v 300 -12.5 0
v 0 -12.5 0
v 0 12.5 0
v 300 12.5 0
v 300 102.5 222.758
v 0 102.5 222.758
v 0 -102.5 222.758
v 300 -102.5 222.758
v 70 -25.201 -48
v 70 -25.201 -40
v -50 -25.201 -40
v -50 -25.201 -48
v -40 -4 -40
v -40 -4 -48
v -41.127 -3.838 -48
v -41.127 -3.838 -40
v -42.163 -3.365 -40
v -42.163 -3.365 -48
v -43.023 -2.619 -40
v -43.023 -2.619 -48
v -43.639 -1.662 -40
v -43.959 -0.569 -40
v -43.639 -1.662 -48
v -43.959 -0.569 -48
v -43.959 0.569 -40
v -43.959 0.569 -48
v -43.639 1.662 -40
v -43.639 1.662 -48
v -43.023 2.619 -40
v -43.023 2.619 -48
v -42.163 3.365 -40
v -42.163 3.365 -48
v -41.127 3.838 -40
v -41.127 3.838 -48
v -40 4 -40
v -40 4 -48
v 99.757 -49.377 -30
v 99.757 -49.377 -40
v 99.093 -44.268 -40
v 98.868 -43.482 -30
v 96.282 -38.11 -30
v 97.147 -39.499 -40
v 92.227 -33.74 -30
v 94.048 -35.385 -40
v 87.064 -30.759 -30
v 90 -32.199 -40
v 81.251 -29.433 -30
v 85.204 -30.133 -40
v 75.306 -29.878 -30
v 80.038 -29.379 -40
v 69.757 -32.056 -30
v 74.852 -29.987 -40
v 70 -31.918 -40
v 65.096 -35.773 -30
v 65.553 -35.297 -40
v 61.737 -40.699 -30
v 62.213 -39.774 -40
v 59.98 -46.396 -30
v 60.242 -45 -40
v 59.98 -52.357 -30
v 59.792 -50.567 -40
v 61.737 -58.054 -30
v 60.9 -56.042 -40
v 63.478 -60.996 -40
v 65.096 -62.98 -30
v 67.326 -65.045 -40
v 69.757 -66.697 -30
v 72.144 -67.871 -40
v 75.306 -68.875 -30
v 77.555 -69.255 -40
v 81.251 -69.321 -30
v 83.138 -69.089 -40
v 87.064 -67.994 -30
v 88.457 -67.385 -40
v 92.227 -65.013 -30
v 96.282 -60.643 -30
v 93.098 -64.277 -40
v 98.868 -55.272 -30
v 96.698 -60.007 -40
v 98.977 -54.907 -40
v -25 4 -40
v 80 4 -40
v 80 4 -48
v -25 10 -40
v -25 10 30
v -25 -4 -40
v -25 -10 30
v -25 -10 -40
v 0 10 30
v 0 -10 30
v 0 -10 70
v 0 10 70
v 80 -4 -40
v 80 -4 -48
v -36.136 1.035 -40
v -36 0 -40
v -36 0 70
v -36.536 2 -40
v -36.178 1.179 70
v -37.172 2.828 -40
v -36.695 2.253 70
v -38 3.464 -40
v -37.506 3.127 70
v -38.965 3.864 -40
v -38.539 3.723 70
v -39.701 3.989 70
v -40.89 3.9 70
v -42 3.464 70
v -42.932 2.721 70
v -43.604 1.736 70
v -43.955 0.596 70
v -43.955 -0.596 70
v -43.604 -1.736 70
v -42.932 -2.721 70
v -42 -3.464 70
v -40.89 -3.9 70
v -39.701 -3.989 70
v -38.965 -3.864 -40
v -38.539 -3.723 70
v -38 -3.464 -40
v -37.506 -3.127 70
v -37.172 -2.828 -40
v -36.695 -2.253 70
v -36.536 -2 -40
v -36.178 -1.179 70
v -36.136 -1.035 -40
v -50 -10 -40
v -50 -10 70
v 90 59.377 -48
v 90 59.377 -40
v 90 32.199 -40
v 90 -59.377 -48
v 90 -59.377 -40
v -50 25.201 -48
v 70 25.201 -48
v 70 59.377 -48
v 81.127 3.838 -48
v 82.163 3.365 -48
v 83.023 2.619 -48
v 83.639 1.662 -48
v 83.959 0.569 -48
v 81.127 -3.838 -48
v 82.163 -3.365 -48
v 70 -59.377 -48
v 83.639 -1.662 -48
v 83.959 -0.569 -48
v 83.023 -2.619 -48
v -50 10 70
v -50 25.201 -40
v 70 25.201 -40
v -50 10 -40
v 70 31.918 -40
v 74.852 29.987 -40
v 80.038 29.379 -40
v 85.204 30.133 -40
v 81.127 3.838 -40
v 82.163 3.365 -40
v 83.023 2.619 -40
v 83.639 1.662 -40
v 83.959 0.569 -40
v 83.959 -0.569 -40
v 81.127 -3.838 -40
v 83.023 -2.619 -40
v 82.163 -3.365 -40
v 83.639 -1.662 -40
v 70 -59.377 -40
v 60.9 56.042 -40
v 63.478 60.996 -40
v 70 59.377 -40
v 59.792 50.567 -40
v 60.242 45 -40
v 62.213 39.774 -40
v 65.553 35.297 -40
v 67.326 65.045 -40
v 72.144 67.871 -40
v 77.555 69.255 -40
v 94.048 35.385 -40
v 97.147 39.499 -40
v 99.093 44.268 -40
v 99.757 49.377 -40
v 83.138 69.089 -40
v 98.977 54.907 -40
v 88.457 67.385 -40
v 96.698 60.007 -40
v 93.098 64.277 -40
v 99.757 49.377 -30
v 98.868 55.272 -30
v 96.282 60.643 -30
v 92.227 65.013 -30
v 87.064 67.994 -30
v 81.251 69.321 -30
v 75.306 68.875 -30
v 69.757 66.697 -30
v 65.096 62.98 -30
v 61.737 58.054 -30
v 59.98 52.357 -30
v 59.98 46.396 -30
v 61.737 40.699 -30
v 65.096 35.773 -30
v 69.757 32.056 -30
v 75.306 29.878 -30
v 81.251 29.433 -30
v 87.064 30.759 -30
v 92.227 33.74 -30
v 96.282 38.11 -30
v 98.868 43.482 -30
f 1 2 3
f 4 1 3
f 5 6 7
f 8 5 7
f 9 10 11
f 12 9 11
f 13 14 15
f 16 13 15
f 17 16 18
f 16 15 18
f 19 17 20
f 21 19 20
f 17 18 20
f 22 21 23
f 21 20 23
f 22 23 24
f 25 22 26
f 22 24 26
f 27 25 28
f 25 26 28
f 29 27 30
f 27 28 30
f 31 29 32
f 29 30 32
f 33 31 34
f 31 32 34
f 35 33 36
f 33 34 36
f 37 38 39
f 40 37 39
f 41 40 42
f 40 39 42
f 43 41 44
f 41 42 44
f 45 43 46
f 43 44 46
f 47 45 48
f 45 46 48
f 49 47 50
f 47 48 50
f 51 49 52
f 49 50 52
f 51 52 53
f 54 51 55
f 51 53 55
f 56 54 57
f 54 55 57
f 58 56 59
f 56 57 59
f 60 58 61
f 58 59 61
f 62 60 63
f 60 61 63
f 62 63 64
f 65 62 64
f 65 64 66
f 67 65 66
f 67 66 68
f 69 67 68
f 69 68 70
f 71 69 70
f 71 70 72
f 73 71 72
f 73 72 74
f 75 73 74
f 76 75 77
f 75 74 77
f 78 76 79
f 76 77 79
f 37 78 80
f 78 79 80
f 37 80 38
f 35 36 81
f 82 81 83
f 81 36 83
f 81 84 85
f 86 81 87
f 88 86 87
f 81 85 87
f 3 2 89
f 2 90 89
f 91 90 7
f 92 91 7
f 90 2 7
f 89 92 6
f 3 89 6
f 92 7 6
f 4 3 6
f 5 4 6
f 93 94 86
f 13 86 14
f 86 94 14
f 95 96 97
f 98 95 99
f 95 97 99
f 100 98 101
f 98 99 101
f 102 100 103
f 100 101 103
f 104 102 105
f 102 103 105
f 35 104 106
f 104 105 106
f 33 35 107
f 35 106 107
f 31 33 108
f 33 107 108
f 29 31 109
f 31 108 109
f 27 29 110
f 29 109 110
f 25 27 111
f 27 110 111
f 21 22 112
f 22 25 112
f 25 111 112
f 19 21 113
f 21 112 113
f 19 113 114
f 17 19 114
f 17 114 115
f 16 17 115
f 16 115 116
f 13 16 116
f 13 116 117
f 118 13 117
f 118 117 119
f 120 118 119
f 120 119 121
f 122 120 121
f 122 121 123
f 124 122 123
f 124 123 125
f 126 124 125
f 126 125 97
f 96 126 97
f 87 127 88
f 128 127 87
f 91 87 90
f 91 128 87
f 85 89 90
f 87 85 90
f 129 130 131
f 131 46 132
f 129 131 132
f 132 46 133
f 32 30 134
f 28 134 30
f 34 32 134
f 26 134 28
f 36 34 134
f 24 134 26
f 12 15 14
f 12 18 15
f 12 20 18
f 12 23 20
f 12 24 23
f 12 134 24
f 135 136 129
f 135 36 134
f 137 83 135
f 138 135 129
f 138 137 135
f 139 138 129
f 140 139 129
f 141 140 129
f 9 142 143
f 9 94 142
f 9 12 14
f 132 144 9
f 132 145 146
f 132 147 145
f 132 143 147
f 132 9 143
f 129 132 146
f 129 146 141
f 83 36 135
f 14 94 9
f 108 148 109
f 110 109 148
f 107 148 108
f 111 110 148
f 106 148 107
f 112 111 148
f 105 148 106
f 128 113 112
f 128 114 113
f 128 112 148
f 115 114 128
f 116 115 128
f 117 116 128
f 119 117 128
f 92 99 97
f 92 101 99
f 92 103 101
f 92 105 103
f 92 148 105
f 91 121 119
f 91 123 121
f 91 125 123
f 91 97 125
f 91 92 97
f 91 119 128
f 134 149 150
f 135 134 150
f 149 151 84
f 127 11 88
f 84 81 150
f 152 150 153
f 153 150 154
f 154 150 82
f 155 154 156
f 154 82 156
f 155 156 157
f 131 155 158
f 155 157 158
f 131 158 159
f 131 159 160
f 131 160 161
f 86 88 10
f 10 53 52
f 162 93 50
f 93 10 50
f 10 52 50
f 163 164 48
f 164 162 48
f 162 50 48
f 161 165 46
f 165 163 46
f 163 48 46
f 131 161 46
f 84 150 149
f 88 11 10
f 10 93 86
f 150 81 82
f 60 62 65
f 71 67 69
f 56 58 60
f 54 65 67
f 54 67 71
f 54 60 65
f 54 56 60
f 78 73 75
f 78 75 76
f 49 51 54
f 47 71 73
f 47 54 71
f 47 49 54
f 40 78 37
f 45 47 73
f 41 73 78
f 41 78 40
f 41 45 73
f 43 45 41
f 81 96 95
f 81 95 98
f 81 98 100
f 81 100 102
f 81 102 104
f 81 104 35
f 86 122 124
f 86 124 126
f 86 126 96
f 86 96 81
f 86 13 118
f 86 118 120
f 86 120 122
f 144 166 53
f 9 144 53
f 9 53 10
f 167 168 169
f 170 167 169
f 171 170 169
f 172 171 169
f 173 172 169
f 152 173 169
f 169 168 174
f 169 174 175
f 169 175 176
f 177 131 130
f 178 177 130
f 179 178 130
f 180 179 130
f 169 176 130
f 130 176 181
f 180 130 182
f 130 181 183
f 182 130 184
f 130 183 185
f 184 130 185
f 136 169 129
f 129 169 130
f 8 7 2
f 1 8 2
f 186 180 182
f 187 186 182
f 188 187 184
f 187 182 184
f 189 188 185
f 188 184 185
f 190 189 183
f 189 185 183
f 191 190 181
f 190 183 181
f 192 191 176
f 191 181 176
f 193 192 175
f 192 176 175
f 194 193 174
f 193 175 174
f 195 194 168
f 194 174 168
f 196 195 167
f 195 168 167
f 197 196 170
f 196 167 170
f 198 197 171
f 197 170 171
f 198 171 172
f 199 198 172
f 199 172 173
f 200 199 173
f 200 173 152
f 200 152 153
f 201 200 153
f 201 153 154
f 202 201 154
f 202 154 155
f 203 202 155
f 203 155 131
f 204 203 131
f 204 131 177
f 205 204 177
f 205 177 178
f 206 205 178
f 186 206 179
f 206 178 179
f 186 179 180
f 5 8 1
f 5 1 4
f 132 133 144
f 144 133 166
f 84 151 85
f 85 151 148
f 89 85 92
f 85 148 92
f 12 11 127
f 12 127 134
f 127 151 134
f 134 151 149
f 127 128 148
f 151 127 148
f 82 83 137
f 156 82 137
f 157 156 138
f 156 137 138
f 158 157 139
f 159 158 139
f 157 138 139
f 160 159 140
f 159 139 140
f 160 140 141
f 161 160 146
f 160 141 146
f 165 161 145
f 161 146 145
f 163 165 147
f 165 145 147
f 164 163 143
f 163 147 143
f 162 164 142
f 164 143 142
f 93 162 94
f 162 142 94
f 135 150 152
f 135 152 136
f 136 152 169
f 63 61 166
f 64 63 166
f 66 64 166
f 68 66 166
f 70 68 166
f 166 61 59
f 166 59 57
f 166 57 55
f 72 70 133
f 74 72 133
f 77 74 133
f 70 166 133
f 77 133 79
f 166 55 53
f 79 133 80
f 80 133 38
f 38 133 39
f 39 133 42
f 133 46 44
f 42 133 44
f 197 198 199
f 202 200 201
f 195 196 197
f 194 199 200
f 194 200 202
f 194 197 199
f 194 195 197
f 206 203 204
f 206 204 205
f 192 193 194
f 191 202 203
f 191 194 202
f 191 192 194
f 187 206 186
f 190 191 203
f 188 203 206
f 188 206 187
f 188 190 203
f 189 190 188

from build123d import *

# Parameters (mm, degrees)
F1_DEPTH  = 300
F2_W      = 20
F2_H      = 40
F3_DEPTH  = 50
F5_W      = 25
F5_H      = 20
F6_DEPTH  = 70
F7_R      = 4
F8_DEPTH  = 120
F10_DEPTH = 8
F11_R     = 20
F12_DEPTH = 10
F14_DEPTH = 8


with BuildPart() as f1:
    # F0 (on Right) → F1 (new body)
    with BuildSketch(Plane.YZ):
        Polygon((0, 222.757817), (-102.5, 222.757817), (-12.5, 0), (0, 0), (12.5, 0), (102.5, 222.757817), align=None)
    extrude(amount=F1_DEPTH)

    # F2 (on face) → F3 (join)
    with BuildSketch(Plane(origin=(0, 0, 0), x_dir=(0, -1, 0), z_dir=(-1, 0, 0))):
        with Locations((0, 50)):
            Rectangle(F2_W, F2_H)
    extrude(amount=F3_DEPTH)

    # F5 (on face) → F6 (join)
    with BuildSketch(Plane(origin=(0, 0, 30), x_dir=(1, 0, 0), z_dir=(0, 0, -1))):
        with Locations((-37.5, 0)):
            Rectangle(F5_W, F5_H)
    extrude(amount=F6_DEPTH)

    # F7 (on face) → F8 (cut)
    with BuildSketch(Plane.XY.offset(70)):
        with Locations((-40, 0)):
            Circle(F7_R)
    extrude(amount=-F8_DEPTH, mode=Mode.SUBTRACT)

    # F9 (on face) → F10 (join)
    with BuildSketch(Plane(origin=(0, 0, -40), x_dir=(1, 0, 0), z_dir=(0, 0, -1))):
        Polygon((-50, 0), (-50, -25.201352), (70, -25.201352), (70, -59.376635), (90, -59.376635), (90, 0), (90, 59.376635), (70, 59.376635), (70, 25.201352), (-50, 25.201352), align=None)
    extrude(amount=F10_DEPTH)

    # F11 (on face) → F12 (join)
    with BuildSketch(Plane.XY.offset(-40)):
        with Locations((79.756841, -49.376635)):
            Circle(F11_R)
        with Locations((79.756841, 49.376635)):
            Circle(F11_R)
    extrude(amount=F12_DEPTH)

    # F13 (on face) → F14 (cut)
    with BuildSketch(Plane(origin=(0, 0, -48), x_dir=(1, 0, 0), z_dir=(0, 0, -1))):
        with BuildLine():
            ThreePointArc((80, -4), (84, 0), (80, 4))
            Line((80, 4), (-40, 4))
            ThreePointArc((-40, 4), (-44, 0), (-40, -4))
            Line((-40, -4), (80, -4))
        make_face()
    extrude(amount=-F14_DEPTH, mode=Mode.SUBTRACT)


solid = f1.part
